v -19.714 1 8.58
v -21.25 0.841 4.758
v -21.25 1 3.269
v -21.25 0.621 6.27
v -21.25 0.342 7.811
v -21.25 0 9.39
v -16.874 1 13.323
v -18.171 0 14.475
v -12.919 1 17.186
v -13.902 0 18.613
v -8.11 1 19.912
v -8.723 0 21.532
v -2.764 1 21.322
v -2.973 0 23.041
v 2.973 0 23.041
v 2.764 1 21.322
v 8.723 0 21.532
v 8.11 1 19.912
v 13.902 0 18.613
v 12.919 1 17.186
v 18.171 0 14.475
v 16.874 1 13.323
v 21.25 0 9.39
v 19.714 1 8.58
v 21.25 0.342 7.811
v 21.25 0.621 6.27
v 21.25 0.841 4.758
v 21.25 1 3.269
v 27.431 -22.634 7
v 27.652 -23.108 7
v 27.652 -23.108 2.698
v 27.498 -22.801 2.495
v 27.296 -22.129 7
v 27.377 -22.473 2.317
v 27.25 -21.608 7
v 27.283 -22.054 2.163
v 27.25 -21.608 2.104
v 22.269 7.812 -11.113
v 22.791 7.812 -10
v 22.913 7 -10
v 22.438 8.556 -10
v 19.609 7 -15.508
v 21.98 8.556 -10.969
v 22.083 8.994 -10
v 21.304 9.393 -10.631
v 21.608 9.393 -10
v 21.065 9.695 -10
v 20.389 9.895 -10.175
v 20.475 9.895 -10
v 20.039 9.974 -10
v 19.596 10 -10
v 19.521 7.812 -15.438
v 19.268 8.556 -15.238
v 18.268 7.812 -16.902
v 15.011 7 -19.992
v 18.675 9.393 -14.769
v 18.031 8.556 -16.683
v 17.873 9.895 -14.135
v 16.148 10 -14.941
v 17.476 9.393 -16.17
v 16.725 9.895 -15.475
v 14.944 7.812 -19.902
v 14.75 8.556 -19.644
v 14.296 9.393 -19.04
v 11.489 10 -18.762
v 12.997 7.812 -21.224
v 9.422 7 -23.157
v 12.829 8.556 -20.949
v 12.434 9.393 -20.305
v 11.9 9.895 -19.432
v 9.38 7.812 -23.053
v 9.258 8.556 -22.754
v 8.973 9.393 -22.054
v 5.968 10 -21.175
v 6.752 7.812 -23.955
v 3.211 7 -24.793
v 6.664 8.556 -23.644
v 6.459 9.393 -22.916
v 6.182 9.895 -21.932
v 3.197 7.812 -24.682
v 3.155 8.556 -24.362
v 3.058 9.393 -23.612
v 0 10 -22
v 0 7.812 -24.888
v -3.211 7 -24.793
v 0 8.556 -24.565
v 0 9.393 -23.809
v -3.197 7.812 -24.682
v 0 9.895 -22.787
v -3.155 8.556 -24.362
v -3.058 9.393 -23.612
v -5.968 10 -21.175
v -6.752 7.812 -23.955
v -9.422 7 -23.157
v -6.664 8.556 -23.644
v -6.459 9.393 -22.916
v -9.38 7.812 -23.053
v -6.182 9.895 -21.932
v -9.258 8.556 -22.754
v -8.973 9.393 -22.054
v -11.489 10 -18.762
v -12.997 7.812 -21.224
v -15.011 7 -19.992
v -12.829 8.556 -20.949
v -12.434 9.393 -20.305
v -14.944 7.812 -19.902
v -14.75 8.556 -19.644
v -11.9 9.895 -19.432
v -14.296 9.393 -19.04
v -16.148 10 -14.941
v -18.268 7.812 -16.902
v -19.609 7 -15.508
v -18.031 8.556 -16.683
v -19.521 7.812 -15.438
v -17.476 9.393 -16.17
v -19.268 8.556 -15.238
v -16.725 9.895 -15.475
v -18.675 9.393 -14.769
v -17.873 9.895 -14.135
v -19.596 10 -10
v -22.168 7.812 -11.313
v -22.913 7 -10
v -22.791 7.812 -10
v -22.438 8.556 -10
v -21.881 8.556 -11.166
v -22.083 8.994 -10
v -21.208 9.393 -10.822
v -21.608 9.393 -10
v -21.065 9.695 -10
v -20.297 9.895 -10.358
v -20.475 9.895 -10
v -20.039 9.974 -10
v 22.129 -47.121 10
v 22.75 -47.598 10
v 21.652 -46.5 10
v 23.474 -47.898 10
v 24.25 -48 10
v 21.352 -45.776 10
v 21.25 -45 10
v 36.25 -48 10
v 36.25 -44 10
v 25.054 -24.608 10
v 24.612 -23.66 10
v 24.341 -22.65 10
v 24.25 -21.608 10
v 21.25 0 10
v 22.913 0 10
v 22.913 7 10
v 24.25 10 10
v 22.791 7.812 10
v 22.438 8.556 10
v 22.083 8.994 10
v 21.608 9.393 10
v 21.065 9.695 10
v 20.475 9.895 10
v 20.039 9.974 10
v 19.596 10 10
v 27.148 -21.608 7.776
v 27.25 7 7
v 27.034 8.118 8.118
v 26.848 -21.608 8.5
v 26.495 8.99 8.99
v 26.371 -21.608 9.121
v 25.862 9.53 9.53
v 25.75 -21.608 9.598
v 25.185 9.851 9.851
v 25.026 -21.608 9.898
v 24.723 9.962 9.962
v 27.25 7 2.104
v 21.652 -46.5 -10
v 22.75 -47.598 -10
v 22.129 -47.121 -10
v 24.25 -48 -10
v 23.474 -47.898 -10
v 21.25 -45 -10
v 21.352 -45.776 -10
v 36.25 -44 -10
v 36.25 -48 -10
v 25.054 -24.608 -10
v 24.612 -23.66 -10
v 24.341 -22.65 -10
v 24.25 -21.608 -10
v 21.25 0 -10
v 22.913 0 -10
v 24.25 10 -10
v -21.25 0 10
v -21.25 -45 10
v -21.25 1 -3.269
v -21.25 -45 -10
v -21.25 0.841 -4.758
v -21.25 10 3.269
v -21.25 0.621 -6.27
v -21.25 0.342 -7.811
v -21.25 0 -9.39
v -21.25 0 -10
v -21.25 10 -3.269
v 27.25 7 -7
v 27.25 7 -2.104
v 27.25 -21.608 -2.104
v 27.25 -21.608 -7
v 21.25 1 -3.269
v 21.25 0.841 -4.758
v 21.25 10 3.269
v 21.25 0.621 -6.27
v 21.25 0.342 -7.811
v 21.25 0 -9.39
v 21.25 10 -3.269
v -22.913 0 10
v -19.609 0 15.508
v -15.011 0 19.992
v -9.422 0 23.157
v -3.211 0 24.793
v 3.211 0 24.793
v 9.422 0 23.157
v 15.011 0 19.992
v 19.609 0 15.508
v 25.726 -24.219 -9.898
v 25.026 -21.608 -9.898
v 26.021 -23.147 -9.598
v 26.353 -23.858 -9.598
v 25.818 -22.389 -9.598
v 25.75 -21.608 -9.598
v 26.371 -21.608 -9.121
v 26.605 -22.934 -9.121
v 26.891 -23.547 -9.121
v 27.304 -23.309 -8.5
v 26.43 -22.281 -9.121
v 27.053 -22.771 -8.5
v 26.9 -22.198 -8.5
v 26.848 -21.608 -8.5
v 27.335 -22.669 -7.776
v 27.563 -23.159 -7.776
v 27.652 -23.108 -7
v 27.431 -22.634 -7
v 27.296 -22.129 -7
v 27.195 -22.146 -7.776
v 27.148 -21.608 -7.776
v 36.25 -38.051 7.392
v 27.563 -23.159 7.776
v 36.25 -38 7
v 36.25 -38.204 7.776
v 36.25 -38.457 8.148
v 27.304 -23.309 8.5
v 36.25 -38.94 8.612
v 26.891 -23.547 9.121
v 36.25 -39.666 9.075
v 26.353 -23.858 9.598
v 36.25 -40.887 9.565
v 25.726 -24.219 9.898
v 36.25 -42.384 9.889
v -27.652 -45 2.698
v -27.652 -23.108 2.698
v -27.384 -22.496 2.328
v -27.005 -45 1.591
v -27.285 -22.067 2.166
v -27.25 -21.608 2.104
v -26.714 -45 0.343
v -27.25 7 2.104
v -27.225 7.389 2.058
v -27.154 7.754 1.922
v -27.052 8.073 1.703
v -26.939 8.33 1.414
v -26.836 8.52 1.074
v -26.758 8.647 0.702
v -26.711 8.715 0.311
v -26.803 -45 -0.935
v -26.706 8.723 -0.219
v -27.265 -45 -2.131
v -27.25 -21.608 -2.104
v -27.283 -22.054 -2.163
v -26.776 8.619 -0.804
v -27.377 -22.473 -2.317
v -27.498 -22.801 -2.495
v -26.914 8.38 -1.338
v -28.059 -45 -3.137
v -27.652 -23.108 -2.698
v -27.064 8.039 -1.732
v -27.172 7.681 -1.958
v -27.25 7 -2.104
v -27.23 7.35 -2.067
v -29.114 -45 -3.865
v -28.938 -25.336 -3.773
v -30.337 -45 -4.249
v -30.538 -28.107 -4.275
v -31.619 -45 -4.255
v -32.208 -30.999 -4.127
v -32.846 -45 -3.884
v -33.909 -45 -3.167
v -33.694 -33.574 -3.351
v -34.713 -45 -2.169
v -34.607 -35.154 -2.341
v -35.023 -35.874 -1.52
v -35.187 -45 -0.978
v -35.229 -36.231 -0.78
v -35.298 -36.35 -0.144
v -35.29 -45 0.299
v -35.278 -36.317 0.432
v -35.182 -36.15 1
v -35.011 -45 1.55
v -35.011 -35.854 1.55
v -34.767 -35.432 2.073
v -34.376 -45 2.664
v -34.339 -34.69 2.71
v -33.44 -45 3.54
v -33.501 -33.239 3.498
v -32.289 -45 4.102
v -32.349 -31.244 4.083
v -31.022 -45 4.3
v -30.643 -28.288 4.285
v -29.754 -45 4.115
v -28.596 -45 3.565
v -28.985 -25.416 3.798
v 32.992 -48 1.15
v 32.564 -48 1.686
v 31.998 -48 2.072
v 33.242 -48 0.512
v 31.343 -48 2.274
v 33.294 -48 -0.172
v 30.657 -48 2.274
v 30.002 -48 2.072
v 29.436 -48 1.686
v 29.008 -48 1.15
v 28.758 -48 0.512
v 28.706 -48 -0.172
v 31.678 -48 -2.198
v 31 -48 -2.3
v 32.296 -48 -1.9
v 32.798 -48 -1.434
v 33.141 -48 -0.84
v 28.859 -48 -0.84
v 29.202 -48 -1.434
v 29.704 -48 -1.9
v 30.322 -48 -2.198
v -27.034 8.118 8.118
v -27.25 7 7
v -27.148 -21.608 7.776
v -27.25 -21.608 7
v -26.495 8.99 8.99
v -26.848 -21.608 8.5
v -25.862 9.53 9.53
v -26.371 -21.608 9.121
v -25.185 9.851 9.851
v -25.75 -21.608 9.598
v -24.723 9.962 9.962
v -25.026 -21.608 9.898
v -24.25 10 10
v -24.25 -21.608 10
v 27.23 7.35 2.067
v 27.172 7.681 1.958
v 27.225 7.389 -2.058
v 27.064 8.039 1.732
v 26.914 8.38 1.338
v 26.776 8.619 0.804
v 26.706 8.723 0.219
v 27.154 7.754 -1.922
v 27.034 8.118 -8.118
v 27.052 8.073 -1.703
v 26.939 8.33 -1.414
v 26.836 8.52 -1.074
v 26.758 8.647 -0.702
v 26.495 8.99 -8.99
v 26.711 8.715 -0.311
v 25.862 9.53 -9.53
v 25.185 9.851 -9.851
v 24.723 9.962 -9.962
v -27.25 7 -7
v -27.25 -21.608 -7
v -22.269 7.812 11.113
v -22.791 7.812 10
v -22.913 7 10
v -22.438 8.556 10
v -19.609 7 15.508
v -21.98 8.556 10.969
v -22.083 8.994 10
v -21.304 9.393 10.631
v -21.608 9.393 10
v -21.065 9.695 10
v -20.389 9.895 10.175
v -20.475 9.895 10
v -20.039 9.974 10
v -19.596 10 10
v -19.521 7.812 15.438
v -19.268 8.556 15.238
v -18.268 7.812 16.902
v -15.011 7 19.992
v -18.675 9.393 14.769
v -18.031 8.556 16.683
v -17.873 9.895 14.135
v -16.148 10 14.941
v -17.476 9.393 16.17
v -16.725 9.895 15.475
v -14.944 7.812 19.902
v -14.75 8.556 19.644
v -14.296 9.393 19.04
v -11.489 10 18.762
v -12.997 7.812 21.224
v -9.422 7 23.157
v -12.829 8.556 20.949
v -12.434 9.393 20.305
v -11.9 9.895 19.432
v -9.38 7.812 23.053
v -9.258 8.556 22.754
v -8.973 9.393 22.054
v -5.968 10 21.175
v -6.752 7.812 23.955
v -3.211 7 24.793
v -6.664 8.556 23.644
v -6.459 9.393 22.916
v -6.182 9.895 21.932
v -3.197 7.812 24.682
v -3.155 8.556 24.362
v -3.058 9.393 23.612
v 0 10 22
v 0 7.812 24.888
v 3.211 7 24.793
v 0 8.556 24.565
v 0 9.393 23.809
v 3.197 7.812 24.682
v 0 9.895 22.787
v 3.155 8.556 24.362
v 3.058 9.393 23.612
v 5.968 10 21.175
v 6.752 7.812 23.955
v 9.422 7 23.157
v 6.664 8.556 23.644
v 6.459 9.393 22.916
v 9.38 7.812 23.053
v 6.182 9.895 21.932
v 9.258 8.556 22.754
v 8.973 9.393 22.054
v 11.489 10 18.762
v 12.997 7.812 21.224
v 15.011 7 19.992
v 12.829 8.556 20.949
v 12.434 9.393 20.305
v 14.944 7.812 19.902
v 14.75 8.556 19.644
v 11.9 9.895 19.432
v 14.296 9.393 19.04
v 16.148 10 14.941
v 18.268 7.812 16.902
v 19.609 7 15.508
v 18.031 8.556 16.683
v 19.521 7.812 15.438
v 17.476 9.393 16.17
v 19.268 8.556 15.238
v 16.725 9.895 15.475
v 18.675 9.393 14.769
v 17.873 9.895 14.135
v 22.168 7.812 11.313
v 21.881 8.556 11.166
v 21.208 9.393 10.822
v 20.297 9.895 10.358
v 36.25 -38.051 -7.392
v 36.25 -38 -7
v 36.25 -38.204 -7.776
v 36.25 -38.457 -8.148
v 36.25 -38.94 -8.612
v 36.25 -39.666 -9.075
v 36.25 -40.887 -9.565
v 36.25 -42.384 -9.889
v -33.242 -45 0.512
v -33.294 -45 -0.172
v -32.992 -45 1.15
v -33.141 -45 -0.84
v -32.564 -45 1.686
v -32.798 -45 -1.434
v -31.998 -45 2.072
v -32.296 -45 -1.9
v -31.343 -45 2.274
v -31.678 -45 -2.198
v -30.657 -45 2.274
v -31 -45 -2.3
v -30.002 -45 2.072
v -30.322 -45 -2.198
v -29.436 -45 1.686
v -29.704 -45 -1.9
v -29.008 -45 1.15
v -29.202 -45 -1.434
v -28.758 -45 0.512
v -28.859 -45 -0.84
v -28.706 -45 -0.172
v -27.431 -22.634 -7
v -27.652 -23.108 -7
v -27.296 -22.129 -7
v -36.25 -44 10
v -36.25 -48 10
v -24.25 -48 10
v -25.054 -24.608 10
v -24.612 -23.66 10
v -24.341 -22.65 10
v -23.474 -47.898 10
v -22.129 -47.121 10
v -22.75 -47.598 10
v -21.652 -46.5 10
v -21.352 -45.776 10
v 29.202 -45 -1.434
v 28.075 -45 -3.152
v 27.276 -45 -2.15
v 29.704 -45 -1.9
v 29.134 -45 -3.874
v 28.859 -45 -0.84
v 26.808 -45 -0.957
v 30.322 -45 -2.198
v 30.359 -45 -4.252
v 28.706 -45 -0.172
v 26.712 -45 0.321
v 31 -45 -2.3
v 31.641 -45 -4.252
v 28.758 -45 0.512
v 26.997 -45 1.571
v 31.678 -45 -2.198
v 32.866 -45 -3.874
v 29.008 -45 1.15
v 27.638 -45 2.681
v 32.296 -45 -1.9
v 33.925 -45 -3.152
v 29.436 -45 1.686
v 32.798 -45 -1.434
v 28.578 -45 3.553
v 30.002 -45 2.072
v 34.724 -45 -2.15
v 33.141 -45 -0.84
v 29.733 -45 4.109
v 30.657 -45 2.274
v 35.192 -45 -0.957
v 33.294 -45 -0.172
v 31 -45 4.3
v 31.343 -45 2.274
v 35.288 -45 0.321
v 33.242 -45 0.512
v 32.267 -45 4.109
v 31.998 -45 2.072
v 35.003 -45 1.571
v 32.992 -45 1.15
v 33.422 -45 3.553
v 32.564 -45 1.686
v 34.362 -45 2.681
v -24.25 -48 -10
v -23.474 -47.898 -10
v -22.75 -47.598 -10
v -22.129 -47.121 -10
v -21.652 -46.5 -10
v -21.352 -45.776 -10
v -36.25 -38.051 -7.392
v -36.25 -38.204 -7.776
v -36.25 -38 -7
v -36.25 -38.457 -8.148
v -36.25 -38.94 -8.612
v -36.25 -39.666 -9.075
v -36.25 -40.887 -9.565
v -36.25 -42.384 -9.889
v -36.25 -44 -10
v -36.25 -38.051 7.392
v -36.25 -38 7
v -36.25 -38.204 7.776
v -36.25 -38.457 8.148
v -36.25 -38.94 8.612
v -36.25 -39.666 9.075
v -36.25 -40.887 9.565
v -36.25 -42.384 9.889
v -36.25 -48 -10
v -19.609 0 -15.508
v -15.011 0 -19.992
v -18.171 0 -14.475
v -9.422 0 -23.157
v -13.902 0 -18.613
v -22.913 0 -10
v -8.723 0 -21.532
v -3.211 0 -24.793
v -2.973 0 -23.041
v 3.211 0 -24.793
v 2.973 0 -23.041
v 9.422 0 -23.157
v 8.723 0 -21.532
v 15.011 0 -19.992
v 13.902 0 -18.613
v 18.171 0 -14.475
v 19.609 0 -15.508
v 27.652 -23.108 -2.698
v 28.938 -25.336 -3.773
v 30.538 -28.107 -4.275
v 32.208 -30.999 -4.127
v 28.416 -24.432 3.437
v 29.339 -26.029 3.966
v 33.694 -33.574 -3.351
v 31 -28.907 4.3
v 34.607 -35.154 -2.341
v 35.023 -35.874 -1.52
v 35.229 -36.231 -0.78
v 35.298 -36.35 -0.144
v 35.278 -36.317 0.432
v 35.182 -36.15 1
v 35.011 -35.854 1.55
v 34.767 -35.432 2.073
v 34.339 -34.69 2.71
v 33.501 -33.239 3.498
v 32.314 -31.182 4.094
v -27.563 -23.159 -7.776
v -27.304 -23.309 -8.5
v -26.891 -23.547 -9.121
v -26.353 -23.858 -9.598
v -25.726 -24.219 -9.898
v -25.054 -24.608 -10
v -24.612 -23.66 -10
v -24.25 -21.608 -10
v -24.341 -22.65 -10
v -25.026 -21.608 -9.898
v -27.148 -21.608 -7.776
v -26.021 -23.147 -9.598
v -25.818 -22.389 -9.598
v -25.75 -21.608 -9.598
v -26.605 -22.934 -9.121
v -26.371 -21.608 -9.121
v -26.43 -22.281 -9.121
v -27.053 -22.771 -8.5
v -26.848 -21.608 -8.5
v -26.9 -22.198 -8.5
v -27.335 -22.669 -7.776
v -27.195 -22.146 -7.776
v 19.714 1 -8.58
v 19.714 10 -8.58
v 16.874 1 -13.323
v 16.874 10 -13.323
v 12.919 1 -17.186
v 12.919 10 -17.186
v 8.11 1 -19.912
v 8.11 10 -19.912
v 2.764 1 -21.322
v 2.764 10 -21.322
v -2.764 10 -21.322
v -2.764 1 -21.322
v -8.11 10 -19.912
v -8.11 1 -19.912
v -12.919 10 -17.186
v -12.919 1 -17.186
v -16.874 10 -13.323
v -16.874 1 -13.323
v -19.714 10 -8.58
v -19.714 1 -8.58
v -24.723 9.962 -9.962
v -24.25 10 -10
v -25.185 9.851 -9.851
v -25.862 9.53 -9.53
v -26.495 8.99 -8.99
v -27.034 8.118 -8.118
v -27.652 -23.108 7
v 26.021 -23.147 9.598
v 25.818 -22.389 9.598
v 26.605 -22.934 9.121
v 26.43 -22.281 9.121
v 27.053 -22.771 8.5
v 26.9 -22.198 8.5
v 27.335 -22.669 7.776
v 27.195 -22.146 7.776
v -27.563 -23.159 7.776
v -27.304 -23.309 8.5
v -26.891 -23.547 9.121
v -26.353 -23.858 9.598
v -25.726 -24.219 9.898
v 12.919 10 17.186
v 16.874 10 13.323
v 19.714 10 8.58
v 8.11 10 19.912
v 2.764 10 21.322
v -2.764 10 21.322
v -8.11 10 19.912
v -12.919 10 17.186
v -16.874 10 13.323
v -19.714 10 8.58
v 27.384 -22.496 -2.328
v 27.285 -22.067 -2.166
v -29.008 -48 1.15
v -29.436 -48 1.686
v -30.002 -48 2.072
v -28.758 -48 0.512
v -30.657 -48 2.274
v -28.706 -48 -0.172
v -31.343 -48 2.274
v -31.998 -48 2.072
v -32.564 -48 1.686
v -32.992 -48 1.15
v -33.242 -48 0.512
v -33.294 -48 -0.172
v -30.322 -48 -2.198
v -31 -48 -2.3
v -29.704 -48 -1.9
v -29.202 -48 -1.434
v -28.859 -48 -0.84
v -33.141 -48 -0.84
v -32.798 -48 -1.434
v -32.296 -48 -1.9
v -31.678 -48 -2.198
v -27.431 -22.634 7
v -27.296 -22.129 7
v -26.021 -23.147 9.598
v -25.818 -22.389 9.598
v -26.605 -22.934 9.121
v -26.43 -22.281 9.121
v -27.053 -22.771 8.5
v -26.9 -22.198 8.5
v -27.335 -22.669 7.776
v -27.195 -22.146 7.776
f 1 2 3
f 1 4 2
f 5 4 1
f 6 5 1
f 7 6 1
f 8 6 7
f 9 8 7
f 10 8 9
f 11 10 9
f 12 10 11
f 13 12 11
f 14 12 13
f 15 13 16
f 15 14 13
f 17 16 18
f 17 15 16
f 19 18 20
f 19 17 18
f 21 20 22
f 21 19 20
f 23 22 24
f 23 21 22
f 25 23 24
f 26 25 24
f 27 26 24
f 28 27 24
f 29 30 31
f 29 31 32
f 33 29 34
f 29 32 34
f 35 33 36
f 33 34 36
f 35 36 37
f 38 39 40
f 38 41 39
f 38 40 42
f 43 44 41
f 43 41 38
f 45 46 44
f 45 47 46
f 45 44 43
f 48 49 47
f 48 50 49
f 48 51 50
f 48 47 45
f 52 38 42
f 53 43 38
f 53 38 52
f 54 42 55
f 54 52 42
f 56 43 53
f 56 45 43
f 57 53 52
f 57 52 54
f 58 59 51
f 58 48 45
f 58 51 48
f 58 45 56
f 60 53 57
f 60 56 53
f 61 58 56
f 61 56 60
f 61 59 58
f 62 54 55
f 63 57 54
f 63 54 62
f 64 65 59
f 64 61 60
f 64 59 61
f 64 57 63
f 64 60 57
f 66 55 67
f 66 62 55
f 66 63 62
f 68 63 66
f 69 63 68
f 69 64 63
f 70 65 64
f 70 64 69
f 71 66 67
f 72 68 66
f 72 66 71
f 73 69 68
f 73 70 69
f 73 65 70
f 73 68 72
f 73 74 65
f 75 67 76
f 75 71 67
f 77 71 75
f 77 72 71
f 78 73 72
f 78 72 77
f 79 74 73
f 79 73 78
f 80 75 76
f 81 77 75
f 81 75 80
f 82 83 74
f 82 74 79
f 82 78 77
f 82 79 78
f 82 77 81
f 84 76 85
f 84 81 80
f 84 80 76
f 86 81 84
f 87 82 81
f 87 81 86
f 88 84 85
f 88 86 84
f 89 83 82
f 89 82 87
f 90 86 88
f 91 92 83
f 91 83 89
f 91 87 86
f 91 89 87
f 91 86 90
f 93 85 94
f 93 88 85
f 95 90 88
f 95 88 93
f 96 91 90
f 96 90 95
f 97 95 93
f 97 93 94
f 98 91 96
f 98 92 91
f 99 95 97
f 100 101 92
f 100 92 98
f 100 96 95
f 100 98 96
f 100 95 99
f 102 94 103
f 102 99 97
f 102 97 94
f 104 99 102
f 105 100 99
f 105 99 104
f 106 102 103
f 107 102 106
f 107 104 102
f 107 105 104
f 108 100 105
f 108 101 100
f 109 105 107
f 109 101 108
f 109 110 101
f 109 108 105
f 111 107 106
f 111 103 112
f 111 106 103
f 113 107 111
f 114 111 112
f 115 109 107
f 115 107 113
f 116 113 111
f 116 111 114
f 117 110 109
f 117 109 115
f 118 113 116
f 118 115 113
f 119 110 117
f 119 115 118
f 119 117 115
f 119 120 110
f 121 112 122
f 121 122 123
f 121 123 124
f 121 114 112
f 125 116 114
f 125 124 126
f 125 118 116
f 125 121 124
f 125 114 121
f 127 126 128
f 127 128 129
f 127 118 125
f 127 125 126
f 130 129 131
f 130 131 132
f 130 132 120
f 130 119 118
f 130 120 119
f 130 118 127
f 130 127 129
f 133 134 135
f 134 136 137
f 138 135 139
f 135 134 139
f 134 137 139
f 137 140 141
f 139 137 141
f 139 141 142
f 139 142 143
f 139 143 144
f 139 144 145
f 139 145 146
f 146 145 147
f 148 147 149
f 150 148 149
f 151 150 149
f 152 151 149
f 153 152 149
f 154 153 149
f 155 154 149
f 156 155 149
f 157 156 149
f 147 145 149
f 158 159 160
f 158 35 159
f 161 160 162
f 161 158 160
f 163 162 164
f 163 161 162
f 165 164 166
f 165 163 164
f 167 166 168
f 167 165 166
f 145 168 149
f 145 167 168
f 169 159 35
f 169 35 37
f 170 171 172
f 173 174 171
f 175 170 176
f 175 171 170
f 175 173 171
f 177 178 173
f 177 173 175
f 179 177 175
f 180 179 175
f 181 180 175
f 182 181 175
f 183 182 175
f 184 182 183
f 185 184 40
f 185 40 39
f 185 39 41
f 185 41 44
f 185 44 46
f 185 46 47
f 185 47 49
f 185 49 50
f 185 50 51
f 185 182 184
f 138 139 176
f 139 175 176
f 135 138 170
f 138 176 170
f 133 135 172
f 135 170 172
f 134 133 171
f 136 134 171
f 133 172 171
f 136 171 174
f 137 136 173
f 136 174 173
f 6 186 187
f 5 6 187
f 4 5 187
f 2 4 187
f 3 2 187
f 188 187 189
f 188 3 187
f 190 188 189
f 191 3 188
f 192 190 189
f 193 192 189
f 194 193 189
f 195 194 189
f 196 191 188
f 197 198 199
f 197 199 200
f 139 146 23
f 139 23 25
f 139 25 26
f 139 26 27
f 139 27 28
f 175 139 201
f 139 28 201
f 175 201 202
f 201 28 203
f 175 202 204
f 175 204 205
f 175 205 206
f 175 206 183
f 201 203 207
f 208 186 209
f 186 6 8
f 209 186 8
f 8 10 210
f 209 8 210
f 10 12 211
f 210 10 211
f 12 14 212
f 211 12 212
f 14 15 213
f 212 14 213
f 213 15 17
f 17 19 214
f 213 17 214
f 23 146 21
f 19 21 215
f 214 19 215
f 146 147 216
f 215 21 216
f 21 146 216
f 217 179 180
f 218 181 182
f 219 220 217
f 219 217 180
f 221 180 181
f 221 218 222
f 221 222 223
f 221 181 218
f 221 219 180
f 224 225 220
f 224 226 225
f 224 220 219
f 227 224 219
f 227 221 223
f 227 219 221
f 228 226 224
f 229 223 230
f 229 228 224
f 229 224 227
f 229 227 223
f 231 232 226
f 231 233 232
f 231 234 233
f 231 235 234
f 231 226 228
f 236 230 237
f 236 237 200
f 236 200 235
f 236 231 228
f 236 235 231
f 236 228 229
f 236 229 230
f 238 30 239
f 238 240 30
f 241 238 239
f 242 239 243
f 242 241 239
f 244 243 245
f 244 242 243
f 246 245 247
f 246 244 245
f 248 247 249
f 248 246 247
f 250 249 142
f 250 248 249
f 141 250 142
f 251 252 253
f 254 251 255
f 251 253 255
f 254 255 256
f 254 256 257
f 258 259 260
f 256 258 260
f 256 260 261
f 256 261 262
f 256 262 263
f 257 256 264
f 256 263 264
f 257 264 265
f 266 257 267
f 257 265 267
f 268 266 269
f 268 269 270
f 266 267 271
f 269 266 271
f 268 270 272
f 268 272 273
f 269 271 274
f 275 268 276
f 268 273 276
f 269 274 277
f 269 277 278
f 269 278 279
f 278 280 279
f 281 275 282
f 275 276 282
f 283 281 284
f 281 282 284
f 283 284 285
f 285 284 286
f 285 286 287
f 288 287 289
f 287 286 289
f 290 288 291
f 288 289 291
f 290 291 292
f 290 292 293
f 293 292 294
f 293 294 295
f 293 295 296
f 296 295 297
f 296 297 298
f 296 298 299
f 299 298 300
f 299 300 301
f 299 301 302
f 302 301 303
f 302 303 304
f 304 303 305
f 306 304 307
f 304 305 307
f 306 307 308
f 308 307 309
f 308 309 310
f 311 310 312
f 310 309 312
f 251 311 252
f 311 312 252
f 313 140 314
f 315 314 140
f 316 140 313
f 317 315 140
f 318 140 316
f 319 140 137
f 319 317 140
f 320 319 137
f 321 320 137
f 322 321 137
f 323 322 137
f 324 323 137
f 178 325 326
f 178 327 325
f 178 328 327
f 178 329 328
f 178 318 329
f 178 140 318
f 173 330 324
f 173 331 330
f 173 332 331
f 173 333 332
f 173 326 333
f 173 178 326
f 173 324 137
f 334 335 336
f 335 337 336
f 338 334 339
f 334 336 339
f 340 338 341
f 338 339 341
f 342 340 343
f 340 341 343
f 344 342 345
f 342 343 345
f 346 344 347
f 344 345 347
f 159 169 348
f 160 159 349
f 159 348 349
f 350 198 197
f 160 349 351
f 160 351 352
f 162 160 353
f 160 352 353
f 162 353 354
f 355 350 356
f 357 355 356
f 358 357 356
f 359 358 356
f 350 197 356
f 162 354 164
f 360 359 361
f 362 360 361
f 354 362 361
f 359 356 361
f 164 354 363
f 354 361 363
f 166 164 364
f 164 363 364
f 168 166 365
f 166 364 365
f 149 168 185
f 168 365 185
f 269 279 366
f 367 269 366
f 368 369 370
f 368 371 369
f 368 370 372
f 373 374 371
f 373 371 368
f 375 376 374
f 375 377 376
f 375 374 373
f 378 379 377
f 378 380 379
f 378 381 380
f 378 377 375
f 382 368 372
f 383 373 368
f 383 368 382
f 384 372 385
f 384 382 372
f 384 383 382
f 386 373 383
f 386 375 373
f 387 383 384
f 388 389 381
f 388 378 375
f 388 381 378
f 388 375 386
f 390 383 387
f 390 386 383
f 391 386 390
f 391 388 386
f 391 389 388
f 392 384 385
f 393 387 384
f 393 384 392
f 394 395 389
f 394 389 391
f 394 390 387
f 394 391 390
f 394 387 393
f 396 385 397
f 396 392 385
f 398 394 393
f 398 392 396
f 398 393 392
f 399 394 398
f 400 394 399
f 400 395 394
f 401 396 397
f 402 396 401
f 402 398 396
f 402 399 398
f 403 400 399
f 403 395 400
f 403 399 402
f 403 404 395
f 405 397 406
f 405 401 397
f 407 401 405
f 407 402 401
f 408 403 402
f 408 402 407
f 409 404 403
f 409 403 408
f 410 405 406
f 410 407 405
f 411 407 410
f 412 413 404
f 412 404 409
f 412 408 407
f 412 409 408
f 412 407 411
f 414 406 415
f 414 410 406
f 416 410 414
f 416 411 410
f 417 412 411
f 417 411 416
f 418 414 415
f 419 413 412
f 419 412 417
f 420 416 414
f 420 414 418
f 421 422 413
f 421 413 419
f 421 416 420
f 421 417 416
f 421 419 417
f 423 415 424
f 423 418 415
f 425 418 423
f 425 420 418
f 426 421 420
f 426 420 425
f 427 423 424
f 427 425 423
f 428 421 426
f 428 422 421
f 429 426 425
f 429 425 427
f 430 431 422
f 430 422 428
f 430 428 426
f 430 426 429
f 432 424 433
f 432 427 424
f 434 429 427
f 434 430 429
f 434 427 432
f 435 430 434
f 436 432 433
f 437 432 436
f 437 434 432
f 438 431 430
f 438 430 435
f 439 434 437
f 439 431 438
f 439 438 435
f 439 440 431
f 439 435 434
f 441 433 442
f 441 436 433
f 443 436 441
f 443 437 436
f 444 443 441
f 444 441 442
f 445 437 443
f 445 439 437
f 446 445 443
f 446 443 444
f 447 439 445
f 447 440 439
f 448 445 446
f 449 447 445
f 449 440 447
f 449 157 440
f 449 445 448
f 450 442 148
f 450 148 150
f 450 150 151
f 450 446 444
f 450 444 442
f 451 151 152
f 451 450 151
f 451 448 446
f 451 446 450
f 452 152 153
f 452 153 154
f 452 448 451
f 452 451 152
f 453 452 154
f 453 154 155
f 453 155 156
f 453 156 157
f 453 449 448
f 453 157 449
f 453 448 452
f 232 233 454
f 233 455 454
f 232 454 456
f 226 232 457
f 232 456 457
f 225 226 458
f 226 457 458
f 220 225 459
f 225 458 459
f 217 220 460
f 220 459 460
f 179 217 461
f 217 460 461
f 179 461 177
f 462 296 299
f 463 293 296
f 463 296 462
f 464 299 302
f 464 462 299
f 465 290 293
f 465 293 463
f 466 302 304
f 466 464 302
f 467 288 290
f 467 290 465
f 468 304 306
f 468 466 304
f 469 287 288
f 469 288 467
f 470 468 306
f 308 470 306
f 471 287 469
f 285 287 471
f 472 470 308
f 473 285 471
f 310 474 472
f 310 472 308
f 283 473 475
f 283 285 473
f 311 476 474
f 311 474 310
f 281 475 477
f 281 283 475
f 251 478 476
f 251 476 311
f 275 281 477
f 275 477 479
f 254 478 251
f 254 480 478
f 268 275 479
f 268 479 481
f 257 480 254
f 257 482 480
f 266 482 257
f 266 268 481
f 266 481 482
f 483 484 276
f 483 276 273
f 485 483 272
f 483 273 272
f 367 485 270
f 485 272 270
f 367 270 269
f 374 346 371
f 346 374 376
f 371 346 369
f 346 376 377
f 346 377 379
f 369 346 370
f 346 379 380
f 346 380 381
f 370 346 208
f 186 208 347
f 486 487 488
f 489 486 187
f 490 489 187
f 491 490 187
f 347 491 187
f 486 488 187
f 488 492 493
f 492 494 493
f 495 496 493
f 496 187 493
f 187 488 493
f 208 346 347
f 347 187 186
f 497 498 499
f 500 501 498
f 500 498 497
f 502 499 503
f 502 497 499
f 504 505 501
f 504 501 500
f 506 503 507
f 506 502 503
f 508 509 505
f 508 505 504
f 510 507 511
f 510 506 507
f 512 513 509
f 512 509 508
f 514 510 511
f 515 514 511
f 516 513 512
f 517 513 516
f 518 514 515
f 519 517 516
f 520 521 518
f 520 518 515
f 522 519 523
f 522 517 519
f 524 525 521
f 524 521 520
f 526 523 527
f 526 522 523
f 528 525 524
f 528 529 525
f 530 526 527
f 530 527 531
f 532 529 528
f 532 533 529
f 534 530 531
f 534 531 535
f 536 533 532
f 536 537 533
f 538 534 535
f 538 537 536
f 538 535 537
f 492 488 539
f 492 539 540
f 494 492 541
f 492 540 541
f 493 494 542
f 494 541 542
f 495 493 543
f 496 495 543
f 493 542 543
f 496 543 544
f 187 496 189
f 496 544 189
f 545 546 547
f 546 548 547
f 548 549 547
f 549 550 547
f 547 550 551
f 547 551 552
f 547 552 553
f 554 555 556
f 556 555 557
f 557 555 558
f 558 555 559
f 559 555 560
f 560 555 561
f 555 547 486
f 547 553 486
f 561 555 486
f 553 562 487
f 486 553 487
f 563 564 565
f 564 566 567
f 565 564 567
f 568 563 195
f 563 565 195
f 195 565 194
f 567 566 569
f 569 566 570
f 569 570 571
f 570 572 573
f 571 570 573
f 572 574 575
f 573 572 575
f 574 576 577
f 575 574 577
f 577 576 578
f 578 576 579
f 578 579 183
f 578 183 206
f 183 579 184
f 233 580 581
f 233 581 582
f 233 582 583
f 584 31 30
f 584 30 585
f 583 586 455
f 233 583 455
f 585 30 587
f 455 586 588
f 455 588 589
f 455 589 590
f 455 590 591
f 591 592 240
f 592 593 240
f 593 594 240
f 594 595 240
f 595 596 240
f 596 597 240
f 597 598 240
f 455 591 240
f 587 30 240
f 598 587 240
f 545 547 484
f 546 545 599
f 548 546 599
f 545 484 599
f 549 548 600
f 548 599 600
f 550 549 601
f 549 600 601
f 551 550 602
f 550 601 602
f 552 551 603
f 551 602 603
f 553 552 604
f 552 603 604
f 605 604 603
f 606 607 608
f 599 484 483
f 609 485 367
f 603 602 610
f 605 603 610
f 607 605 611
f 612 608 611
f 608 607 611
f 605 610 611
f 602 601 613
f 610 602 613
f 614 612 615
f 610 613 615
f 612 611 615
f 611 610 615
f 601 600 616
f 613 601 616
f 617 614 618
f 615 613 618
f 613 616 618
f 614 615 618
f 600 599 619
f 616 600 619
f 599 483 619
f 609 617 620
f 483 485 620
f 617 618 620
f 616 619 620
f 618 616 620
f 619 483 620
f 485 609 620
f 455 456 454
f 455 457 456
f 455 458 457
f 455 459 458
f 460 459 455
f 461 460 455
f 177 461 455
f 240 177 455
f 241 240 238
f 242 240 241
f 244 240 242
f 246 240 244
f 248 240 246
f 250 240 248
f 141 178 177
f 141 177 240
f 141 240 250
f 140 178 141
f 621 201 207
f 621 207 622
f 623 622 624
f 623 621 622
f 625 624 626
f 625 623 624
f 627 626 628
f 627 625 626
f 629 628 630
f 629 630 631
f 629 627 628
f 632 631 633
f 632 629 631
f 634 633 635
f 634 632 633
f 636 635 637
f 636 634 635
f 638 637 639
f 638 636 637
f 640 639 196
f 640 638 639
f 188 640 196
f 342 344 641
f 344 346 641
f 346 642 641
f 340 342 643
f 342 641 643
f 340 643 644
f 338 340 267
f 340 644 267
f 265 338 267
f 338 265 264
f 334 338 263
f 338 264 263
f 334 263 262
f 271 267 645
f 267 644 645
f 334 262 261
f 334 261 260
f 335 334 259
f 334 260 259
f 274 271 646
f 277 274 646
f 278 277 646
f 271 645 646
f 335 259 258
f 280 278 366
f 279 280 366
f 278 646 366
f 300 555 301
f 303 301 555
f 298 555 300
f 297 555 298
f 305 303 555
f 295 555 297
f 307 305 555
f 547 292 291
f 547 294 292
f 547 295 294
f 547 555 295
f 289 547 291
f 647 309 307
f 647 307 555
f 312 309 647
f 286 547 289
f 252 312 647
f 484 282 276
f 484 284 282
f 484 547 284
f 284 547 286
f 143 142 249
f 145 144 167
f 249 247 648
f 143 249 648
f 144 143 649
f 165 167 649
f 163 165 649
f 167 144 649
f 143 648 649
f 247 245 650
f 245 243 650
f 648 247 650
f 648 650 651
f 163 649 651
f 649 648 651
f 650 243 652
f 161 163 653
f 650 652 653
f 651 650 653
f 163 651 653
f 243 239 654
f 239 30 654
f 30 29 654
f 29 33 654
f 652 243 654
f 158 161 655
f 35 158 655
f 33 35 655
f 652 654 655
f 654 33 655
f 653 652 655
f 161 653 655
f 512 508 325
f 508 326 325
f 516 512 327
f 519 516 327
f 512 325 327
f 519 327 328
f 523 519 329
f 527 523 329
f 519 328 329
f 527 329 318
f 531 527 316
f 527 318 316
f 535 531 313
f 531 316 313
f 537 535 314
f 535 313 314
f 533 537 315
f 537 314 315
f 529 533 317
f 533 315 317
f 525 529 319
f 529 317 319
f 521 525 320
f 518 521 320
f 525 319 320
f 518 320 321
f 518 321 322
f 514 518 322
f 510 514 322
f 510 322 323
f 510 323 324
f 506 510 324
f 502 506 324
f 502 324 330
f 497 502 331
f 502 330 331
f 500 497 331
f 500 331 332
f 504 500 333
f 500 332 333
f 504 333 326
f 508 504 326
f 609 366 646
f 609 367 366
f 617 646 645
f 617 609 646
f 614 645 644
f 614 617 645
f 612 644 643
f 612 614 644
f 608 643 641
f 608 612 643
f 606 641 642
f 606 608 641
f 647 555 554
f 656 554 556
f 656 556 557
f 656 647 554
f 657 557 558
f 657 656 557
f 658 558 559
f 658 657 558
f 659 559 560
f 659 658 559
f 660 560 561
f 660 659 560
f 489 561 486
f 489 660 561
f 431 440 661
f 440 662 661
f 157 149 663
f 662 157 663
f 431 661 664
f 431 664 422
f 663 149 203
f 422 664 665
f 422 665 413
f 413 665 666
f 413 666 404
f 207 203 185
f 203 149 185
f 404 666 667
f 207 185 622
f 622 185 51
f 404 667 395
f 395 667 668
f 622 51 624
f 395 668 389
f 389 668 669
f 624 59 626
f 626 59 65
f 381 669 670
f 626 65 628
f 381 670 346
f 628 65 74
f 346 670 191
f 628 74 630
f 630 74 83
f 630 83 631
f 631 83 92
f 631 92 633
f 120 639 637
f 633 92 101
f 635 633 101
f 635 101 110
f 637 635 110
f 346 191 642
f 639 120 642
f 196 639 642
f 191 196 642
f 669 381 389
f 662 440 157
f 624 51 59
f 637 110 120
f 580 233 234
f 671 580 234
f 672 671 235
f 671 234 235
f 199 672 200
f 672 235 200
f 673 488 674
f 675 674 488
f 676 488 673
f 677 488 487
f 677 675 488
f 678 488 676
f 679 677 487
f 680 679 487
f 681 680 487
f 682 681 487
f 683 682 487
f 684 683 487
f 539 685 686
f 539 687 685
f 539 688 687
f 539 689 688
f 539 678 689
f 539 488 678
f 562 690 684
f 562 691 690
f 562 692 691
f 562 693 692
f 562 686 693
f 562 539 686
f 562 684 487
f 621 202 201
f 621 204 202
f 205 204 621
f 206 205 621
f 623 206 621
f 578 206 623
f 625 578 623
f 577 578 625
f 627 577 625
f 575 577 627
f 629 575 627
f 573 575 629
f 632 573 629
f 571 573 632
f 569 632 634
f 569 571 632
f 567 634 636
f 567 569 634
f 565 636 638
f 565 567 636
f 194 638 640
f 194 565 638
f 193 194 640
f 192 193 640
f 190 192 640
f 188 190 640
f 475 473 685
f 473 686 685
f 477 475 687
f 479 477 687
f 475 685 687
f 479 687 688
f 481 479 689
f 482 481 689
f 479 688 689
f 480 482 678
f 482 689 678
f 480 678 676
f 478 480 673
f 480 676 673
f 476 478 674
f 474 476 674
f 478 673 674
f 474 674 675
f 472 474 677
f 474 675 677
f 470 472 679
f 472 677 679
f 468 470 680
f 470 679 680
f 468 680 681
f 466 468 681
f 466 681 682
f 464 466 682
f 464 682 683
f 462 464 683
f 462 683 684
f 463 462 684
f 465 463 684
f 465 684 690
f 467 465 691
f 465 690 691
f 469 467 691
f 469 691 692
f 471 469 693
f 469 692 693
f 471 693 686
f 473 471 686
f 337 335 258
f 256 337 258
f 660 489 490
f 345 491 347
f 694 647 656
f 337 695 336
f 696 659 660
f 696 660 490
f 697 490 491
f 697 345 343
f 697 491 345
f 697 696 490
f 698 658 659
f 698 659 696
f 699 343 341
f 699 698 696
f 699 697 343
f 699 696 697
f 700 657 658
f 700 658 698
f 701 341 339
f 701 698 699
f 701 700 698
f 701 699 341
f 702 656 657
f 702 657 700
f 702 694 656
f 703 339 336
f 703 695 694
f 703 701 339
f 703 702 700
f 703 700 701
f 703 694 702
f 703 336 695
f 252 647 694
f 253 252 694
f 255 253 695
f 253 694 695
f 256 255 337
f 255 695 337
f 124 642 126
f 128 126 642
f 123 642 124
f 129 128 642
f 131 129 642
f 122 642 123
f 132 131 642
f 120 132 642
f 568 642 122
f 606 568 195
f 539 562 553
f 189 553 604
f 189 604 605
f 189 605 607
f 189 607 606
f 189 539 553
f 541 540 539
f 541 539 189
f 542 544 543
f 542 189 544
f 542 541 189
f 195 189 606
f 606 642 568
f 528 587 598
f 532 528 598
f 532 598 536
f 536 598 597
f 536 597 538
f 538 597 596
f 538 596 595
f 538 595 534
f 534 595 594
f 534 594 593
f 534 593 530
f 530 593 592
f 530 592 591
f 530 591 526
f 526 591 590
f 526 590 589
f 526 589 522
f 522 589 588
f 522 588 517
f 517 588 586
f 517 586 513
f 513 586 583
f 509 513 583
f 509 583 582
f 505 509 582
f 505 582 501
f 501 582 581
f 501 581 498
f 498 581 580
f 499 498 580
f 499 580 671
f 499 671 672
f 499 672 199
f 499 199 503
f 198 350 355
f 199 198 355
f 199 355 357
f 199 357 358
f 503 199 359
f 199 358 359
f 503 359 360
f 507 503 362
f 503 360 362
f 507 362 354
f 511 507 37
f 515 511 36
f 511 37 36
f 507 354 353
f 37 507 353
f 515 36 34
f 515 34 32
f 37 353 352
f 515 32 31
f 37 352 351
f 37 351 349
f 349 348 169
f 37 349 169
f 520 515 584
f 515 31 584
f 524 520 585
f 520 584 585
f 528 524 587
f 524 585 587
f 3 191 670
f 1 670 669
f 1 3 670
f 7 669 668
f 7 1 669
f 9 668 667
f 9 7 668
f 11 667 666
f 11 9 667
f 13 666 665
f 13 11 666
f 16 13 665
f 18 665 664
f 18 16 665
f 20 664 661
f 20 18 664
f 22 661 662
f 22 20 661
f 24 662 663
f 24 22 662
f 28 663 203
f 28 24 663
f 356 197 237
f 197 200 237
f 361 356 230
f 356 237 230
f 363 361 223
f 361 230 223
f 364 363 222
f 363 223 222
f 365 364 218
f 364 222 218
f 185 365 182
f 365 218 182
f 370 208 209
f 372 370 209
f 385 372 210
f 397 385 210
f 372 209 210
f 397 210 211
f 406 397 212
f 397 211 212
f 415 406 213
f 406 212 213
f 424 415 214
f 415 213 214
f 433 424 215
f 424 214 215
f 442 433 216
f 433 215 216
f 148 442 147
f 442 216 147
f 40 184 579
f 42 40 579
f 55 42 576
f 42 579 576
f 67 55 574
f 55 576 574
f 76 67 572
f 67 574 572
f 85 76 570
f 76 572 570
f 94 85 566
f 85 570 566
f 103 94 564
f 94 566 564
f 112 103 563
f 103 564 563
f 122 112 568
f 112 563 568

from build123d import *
from OCP.BRepFilletAPI import BRepFilletAPI_MakeChamfer

# Parameters (mm, degrees)
SKETCH_1_R          = 25
SKETCH_1_R_2        = 21.5
EXTRUDE_1_DEPTH     = 10
SKETCH_2_W          = 6
SKETCH_2_H          = 20
EXTRUDE_2_DEPTH     = 58
SKETCH_3_W          = 15
SKETCH_3_H          = 20
EXTRUDE_3_DEPTH     = 10
SKETCH_4_R          = 2.3
CUT_EXTRUDE_1_DEPTH = 73.822129192
CHAMFER_2_SIZE      = 15.588457268
CHAMFER_2_SIZE_2    = 9
FILLET_1_R          = 3
SKETCH_5_R          = 4.3
CUT_EXTRUDE_2_DEPTH = 55
CHAMFER_3_SIZE      = 1
CHAMFER_3_SIZE2     = 1.732050808


with BuildPart() as part:
    # Sketch 1 → Extrude 1 (new body)
    with BuildSketch(Plane(origin=(0, 0, 0), x_dir=(1, 0, 0), z_dir=(0, 1, 0))):
        with Locations(Location((0, 0, 0), (0, 0, 270))):
            Circle(SKETCH_1_R)
        with Locations(Location((0, 0, 0), (0, 0, 270))):
            Circle(SKETCH_1_R_2, mode=Mode.SUBTRACT)
    extrude(amount=EXTRUDE_1_DEPTH)

    # Sketch 2 → Extrude 2 (add)
    with BuildSketch(Plane(origin=(0, 10, 0), x_dir=(-1, 0, 0), z_dir=(0, -1, 0))):
        with Locations((-24.25, 0)):
            Rectangle(SKETCH_2_W, SKETCH_2_H)
        with Locations((24.25, 0)):
            Rectangle(SKETCH_2_W, SKETCH_2_H)
    extrude(amount=EXTRUDE_2_DEPTH)

    # Sketch 3 → Extrude 3 (add)
    with BuildSketch(Plane.XZ.offset(48)):
        with Locations((28.75, 0)):
            Rectangle(SKETCH_3_W, SKETCH_3_H)
        with Locations((-28.75, 0)):
            Rectangle(SKETCH_3_W, SKETCH_3_H)
    extrude(amount=-EXTRUDE_3_DEPTH)

    # Sketch 4 → Cut-Extrude 1 (cut, through all)
    with BuildSketch(Plane.XZ.offset(48)):
        with Locations(Location((31, 0, 0), (0, 0, 270))):
            Circle(SKETCH_4_R)
        with Locations(Location((-31, 0, 0), (0, 0, 270))):
            Circle(SKETCH_4_R)
    extrude(amount=-CUT_EXTRUDE_1_DEPTH, mode=Mode.SUBTRACT)

    # Chamfer 2
    # the kernel refuses this chamfer: 15.588457268, 9 mm, written as the material it adds along each edge
    with BuildSketch(Plane(origin=(27.25, -38, 10), x_dir=(-0.01932676561270058, 0.9998132206222079, 0), z_dir=(0, 0, -1))) as chamfer_2_piece_1_section:
        Polygon((CHAMFER_2_SIZE * 0.99981322063, CHAMFER_2_SIZE * 0.0193267656128), (-CHAMFER_2_SIZE_2 * 0.0193267656127, CHAMFER_2_SIZE_2 * 0.999813220622), (0, 0), align=None)
    chamfer_2_piece_1 = extrude(amount=20, mode=Mode.PRIVATE)
    chamfer_2_piece_1 = split(chamfer_2_piece_1, bisect_by=Plane(origin=(36.25, -24.615994123, -6.666666667), z_dir=(-1, 0, 0)), keep=Keep.TOP, mode=Mode.PRIVATE)
    chamfer_2_piece_1 = chamfer_2_piece_1 - Plane(origin=(31, -24.615994123, 0), x_dir=(0, 0, -1), z_dir=(0, -1, 0)) * Cylinder(2.3, 103, mode=Mode.PRIVATE)
    add(chamfer_2_piece_1)
    with BuildSketch(Plane(origin=(-27.25, -38, -10), x_dir=(-0.9983227437537927, -0.0578938624026717, 0), z_dir=(0, 0, 1))) as chamfer_2_piece_2_section:
        Polygon((CHAMFER_2_SIZE_2 * 0.998322743754, -CHAMFER_2_SIZE_2 * 0.0578938624027), (-CHAMFER_2_SIZE * 0.0578938624031, -CHAMFER_2_SIZE * 0.998322743761), (0, 0), align=None)
    chamfer_2_piece_2 = extrude(amount=20, mode=Mode.PRIVATE)
    chamfer_2_piece_2 = split(chamfer_2_piece_2, bisect_by=Plane(origin=(-36.25, -35.368298987, 6.666666667), z_dir=(1, 0, 0)), keep=Keep.TOP, mode=Mode.PRIVATE)
    chamfer_2_piece_2 = chamfer_2_piece_2 - Plane(origin=(-31, -35.368298987, 0), x_dir=(0, 0, -1), z_dir=(0, -1, 0)) * Cylinder(2.3, 103, mode=Mode.PRIVATE)
    add(chamfer_2_piece_2)

    # Fillet 1
    fillet_1_edges = [part.edges().sort_by_distance(p)[0] for p in [
        (27.25, -6.205771366, -10),
        (27.25, -6.205771366, 10),
        (27.25, -22.411542732, 0),
        (-27.25, -6.205771366, -10),
        (-27.25, -6.205771366, 10),
        (-27.25, -22.411542732, 0),
        (31.75, -30.205771366, 10),
        (31.75, -30.205771366, -10),
        (-31.75, -30.205771366, 10),
        (-31.75, -30.205771366, -10),
        (0, 10, -25),
        (27.25, 10, 0),
        (21.25, -48, 0),
        (0, 10, 25),
        (-27.25, 10, 0),
        (-21.25, -48, 0),
    ]]
    fillet(fillet_1_edges, radius=FILLET_1_R)

    # Sketch 5 → Cut-Extrude 2 (cut)
    with BuildSketch(Plane(origin=(0, 10, 0), x_dir=(1, 0, 0), z_dir=(0, 1, 0))):
        with Locations(Location((31, 0, 0), (0, 0, 270))):
            Circle(SKETCH_5_R)
        with Locations(Location((-31, 0, 0), (0, 0, 321.134589702))):
            Circle(SKETCH_5_R)
    extrude(amount=-CUT_EXTRUDE_2_DEPTH, mode=Mode.SUBTRACT)

    # Chamfer 3: one chamfer whose edges measure the first distance from different faces: ONE call of the kernel's chamfer builder (chamfer() names one face for all edges)
    chamfer_3_edges_1 = [part.edges().sort_by_distance(p)[0] for p in [
        (0, 0, -21.5),
    ]]
    chamfer_3_side_1 = [part.faces().sort_by_distance(p)[0] for p in [
        (0, 5, -21.5),
    ]]
    chamfer_3_edges_2 = [part.edges().sort_by_distance(p)[0] for p in [
        (0, 0, 21.5),
    ]]
    chamfer_3_side_2 = [part.faces().sort_by_distance(p)[0] for p in [
        (0, 5, 21.5),
    ]]
    chamfer_3 = BRepFilletAPI_MakeChamfer(part.part.solid().wrapped)
    for e in chamfer_3_edges_1:
        chamfer_3.Add(CHAMFER_3_SIZE, CHAMFER_3_SIZE2, e.wrapped, chamfer_3_side_1[0].wrapped)  # the first distance lies on this face
    for e in chamfer_3_edges_2:
        chamfer_3.Add(CHAMFER_3_SIZE, CHAMFER_3_SIZE2, e.wrapped, chamfer_3_side_2[0].wrapped)  # the first distance lies on this face
    add(Compound.cast(chamfer_3.Shape()), mode=Mode.REPLACE)


solid = part.part
